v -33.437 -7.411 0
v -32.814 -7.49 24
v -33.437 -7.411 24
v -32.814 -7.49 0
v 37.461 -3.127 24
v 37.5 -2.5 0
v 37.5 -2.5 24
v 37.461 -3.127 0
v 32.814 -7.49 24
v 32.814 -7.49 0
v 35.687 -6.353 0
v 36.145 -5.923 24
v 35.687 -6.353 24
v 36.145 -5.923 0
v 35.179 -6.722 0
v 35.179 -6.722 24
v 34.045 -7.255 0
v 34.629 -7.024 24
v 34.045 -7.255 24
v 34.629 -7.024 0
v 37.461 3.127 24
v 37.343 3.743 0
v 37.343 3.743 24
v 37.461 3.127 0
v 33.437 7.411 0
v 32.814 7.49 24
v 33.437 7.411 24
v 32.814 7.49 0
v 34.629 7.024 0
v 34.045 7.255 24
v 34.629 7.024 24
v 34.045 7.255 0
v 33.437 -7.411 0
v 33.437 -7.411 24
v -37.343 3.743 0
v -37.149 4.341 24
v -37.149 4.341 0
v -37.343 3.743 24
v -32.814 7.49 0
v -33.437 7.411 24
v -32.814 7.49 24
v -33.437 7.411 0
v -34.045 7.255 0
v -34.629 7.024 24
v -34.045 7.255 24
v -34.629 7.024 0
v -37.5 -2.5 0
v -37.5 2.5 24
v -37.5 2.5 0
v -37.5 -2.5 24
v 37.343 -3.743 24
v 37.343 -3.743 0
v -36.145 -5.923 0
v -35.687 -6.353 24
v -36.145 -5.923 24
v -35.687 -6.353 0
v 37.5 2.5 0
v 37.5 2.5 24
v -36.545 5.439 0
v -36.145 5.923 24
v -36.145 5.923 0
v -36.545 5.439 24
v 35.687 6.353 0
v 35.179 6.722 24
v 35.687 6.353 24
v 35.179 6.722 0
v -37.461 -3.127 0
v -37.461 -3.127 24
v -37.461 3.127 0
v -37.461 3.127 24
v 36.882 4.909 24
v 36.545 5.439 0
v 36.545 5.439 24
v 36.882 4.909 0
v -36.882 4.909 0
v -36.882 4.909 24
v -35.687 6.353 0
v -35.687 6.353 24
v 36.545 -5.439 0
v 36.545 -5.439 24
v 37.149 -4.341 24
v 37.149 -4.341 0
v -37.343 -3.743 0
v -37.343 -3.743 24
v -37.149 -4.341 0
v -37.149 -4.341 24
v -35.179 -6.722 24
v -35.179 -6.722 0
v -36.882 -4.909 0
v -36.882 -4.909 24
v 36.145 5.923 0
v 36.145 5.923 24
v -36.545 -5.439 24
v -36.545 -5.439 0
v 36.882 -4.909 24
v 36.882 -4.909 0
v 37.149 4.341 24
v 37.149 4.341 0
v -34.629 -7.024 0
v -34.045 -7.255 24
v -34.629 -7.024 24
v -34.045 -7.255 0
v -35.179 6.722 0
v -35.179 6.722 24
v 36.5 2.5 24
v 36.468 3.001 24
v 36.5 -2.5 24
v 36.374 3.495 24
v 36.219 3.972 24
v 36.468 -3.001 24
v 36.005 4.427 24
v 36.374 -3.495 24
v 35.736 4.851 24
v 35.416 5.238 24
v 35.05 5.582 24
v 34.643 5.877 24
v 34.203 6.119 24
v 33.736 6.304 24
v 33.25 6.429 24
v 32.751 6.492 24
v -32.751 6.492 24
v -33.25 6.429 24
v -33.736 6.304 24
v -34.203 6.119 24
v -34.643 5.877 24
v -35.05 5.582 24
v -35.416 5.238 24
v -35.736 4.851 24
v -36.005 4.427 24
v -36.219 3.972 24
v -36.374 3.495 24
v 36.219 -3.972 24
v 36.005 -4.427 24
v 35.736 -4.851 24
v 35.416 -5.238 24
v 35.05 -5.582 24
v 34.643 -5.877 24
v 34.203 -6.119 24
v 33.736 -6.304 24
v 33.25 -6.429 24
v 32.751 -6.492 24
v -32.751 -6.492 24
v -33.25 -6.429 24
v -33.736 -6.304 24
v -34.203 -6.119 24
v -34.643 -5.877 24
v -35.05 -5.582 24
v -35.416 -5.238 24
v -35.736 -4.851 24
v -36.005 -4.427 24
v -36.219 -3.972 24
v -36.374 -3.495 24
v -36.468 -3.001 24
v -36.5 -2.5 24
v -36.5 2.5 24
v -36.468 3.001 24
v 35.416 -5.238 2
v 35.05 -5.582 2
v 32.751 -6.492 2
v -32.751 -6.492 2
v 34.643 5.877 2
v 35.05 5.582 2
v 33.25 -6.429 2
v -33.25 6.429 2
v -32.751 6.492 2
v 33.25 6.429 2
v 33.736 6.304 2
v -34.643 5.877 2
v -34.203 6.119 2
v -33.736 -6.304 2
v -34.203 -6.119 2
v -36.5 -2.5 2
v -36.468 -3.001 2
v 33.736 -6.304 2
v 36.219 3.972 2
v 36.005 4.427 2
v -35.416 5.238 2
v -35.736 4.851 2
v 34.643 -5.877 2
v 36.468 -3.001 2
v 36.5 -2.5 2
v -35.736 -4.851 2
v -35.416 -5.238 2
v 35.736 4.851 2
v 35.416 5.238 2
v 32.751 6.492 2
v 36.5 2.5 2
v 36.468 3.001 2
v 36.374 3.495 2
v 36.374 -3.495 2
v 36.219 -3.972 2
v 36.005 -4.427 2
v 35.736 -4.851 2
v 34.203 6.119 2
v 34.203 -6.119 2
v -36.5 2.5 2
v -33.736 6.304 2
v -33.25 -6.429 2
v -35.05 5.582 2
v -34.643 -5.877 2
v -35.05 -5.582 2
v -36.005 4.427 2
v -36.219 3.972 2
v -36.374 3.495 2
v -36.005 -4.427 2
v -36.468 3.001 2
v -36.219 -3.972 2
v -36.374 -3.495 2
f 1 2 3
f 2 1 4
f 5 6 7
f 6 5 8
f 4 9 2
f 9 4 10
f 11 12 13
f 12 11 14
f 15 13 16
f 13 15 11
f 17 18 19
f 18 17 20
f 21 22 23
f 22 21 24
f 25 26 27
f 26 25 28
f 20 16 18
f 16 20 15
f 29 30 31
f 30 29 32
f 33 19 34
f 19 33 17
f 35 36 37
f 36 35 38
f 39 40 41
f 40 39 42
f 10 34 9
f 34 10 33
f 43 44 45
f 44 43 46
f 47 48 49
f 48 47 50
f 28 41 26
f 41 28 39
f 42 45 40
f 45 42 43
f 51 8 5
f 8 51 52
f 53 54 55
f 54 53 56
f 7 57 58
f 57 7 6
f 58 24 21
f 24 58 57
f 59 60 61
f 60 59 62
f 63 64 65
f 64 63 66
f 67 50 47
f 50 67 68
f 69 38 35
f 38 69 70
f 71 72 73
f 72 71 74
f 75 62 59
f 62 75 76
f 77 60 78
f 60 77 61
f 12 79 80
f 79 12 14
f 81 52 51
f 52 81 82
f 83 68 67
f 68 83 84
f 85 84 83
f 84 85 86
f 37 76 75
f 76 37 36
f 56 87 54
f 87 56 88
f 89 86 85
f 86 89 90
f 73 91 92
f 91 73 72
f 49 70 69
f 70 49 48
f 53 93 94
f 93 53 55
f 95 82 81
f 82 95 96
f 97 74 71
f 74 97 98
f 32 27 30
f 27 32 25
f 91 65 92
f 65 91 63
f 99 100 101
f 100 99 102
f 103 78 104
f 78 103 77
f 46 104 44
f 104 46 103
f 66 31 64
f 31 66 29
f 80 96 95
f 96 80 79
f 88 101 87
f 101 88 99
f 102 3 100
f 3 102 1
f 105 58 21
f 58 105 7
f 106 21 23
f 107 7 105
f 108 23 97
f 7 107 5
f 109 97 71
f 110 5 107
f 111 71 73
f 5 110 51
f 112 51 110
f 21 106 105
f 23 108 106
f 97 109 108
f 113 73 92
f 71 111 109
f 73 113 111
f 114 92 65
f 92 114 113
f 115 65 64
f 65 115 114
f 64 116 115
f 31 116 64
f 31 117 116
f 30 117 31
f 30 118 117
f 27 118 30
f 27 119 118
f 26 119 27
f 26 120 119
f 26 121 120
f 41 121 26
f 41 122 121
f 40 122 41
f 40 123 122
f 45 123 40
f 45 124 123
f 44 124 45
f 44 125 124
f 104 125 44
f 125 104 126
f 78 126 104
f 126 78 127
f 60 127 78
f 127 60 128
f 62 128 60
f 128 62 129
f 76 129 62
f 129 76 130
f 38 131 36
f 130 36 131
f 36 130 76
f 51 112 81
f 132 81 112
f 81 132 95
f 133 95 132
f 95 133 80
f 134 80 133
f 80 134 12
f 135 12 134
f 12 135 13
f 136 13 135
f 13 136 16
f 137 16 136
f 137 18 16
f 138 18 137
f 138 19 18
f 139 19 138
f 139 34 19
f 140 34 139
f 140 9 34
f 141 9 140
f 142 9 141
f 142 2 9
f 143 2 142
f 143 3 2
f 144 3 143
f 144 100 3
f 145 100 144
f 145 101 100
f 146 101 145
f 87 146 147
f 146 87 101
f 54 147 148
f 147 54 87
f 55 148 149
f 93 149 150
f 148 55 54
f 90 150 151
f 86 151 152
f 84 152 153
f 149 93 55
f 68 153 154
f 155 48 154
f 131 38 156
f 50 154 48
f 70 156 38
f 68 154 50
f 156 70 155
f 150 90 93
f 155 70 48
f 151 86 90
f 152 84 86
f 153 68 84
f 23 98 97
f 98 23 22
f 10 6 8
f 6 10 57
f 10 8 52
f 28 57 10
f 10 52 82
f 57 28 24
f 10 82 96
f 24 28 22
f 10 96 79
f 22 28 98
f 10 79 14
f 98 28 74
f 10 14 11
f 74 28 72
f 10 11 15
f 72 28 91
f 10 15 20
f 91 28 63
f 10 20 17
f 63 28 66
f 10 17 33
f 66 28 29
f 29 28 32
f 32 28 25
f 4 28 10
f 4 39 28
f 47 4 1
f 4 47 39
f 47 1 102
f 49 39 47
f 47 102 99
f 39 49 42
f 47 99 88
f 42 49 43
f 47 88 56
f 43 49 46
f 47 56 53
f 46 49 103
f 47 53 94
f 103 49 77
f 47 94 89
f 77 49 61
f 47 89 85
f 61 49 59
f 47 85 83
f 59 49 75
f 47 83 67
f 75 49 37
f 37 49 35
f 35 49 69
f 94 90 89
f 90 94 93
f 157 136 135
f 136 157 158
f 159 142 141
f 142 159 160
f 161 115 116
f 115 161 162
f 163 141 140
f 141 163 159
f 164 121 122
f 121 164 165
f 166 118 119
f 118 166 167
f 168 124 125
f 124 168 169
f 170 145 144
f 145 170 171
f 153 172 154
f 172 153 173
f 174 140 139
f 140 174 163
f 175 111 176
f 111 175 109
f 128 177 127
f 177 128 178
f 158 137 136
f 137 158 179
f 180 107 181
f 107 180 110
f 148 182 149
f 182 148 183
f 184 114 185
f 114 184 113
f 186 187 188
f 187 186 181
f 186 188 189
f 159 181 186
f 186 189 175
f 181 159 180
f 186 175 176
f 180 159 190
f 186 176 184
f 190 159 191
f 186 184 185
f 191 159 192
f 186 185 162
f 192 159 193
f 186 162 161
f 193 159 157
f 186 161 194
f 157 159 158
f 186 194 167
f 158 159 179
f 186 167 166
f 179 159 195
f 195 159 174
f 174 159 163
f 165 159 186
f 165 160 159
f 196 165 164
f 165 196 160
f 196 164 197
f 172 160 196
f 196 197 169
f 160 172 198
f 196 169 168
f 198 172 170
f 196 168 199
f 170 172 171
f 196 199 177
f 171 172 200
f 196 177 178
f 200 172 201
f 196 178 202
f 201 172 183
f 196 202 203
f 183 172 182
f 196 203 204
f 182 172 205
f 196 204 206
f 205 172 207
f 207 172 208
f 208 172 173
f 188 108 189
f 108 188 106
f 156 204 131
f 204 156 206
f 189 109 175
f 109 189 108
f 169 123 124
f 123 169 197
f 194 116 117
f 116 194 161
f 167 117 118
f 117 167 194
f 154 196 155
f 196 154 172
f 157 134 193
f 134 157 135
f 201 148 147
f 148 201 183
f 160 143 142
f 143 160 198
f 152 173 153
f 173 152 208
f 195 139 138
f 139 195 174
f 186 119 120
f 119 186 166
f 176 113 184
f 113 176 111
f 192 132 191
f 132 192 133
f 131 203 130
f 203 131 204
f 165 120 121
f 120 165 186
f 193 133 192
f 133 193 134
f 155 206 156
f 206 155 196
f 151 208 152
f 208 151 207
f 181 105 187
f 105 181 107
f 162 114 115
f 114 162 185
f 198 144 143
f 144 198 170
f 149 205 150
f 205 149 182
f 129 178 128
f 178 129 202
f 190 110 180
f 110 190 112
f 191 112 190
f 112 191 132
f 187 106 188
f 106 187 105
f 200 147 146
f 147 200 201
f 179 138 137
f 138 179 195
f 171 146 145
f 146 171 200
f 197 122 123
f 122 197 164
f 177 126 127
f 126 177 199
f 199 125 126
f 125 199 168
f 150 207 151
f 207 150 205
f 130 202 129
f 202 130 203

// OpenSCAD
$fn = 50;


difference() {
	union() {
		hull() {
			translate(v = [-32.5000000000, 2.5000000000, 0]) {
				cylinder(h = 24, r = 5);
			}
			translate(v = [32.5000000000, 2.5000000000, 0]) {
				cylinder(h = 24, r = 5);
			}
			translate(v = [-32.5000000000, -2.5000000000, 0]) {
				cylinder(h = 24, r = 5);
			}
			translate(v = [32.5000000000, -2.5000000000, 0]) {
				cylinder(h = 24, r = 5);
			}
		}
	}
	union() {
		translate(v = [0, 0, 2]) {
			hull() {
				translate(v = [-32.5000000000, 2.5000000000, 0]) {
					cylinder(h = 22, r = 4);
				}
				translate(v = [32.5000000000, 2.5000000000, 0]) {
					cylinder(h = 22, r = 4);
				}
				translate(v = [-32.5000000000, -2.5000000000, 0]) {
					cylinder(h = 22, r = 4);
				}
				translate(v = [32.5000000000, -2.5000000000, 0]) {
					cylinder(h = 22, r = 4);
				}
			}
		}
	}
}
